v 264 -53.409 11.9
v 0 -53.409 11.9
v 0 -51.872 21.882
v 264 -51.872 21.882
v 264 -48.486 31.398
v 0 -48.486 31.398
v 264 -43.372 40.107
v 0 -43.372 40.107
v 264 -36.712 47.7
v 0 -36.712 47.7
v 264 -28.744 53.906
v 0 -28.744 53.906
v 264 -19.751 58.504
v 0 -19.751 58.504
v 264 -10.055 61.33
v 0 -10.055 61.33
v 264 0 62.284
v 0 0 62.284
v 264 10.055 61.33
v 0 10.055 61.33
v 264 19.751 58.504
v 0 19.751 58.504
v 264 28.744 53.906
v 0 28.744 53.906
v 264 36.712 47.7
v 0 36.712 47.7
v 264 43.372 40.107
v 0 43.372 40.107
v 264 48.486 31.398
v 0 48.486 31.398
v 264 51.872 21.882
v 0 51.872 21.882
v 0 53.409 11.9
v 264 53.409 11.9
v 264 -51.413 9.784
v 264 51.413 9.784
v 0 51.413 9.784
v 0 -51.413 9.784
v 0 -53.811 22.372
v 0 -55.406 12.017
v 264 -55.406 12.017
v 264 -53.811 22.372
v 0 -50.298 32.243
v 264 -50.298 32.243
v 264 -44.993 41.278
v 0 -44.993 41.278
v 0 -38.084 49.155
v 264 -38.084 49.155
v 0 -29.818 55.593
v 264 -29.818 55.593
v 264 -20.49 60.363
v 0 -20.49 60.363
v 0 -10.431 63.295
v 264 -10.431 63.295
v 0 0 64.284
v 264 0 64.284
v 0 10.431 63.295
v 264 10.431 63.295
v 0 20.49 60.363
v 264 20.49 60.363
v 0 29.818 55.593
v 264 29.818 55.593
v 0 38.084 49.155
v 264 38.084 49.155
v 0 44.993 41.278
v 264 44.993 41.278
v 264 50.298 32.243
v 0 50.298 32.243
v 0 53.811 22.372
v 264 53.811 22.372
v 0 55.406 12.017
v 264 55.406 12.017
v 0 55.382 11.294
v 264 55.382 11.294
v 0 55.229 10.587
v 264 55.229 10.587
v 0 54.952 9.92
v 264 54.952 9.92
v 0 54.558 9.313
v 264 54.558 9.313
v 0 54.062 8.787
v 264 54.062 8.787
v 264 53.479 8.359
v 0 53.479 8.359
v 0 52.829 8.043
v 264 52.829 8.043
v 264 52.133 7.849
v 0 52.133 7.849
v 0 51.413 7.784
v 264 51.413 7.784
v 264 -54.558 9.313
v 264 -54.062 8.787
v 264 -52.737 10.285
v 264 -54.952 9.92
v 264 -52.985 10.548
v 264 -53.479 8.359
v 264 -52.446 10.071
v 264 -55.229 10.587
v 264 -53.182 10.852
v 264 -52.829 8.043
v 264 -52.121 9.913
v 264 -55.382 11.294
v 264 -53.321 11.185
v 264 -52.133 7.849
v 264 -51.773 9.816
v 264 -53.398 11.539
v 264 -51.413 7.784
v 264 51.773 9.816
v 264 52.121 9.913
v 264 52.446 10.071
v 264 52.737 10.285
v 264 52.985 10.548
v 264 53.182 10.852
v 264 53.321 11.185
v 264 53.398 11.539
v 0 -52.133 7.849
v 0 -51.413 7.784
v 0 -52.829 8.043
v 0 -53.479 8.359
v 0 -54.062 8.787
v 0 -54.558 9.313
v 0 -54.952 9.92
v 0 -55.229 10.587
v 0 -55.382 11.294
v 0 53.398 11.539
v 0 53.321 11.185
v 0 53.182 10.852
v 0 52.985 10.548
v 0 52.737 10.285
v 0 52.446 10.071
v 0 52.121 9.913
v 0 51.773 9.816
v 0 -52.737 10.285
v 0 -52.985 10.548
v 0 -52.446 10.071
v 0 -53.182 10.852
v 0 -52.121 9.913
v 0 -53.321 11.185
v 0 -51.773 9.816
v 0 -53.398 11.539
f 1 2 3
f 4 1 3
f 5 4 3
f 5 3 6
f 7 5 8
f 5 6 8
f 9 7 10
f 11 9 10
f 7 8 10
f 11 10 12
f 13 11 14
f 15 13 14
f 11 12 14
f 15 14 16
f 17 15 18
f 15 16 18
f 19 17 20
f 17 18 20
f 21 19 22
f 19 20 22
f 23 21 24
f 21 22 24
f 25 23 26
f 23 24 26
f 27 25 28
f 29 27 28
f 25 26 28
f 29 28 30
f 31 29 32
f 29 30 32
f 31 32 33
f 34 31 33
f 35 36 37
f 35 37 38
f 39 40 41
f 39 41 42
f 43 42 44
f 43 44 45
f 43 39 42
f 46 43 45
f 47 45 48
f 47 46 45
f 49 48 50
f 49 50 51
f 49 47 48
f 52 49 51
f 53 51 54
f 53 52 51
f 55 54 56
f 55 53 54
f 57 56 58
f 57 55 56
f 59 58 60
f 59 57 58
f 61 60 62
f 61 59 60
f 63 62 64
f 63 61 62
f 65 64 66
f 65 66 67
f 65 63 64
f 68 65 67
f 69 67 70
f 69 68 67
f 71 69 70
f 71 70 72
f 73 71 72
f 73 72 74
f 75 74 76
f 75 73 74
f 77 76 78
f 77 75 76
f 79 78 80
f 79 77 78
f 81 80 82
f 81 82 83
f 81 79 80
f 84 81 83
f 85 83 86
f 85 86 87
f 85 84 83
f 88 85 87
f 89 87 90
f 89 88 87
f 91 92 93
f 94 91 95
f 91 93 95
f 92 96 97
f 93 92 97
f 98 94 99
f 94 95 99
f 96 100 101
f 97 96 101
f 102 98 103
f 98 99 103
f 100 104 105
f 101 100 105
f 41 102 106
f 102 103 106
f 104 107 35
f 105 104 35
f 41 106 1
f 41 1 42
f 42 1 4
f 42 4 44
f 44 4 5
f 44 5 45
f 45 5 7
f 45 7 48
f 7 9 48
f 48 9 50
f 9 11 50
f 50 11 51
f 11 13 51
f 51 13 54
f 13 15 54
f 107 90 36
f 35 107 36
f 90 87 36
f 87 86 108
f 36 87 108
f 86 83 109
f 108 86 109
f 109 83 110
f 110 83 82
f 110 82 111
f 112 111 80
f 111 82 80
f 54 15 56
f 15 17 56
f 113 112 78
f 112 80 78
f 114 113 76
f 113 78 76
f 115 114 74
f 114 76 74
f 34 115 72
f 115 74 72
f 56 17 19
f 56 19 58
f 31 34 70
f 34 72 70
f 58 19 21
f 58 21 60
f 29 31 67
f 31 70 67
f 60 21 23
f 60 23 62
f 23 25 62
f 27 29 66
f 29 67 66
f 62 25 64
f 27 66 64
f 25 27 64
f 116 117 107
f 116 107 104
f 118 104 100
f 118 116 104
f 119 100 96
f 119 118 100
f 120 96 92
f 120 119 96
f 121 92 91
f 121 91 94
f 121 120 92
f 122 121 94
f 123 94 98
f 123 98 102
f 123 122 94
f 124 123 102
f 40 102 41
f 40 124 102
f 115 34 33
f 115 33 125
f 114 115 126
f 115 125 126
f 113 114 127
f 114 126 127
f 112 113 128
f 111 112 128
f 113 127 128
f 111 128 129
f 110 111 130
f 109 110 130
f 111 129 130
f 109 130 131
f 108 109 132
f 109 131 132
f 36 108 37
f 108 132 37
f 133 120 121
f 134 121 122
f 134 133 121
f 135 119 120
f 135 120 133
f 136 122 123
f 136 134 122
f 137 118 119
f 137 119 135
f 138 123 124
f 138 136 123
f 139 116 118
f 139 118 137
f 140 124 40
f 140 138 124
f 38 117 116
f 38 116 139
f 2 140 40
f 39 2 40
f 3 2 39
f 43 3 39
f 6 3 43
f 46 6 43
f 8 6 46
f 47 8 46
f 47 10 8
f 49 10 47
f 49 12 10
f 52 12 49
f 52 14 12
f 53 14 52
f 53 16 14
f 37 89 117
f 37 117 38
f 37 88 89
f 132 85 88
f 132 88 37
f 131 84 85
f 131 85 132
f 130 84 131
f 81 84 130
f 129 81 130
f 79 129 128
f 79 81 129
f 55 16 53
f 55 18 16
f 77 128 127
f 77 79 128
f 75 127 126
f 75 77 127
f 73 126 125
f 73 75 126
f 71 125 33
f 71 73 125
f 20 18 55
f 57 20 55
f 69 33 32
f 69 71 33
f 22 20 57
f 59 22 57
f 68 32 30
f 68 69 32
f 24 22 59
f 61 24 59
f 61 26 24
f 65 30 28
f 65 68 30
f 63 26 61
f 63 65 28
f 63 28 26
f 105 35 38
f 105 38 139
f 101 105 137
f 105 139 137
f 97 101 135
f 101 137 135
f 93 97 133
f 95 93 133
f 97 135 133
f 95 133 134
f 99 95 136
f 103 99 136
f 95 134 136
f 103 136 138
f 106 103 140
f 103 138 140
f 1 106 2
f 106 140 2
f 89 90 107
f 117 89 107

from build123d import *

# Parameters (mm, degrees)
BOSS_EXTRUDE1_DEPTH = 264


with BuildPart() as part:
    # Sketch1 → Boss-Extrude1 (new body)
    with BuildSketch(Plane(origin=(0, 0, 0), x_dir=(0, 0, -1), z_dir=(1, 0, 0))):
        with BuildLine():
            Line((-7.783565859, 51.412547107), (-7.783565859, -51.412547107))
            ThreePointArc((-7.783565859, -51.412547107), (-9.038756106, -54.322189596), (-12.016575568, -55.405754649))
            ThreePointArc((-12.016575568, -55.405754649), (-64.283565859, 0), (-12.016575568, 55.405754649))
            ThreePointArc((-12.016575568, 55.405754649), (-9.038756106, 54.322189596), (-7.783565859, 51.412547107))
        make_face()
        with BuildLine():
            Line((-9.783565859, 51.412547107), (-9.783565859, -51.412547107))
            ThreePointArc((-9.783565859, -51.412547107), (-10.411160983, -52.867368352), (-11.900070714, -53.409150878))
            ThreePointArc((-11.900070714, -53.409150878), (-62.283565859, 0), (-11.900070714, 53.409150878))
            ThreePointArc((-11.900070714, 53.409150878), (-10.411160983, 52.867368352), (-9.783565859, 51.412547107))
        make_face(mode=Mode.SUBTRACT)
    extrude(amount=BOSS_EXTRUDE1_DEPTH)


solid = part.part
